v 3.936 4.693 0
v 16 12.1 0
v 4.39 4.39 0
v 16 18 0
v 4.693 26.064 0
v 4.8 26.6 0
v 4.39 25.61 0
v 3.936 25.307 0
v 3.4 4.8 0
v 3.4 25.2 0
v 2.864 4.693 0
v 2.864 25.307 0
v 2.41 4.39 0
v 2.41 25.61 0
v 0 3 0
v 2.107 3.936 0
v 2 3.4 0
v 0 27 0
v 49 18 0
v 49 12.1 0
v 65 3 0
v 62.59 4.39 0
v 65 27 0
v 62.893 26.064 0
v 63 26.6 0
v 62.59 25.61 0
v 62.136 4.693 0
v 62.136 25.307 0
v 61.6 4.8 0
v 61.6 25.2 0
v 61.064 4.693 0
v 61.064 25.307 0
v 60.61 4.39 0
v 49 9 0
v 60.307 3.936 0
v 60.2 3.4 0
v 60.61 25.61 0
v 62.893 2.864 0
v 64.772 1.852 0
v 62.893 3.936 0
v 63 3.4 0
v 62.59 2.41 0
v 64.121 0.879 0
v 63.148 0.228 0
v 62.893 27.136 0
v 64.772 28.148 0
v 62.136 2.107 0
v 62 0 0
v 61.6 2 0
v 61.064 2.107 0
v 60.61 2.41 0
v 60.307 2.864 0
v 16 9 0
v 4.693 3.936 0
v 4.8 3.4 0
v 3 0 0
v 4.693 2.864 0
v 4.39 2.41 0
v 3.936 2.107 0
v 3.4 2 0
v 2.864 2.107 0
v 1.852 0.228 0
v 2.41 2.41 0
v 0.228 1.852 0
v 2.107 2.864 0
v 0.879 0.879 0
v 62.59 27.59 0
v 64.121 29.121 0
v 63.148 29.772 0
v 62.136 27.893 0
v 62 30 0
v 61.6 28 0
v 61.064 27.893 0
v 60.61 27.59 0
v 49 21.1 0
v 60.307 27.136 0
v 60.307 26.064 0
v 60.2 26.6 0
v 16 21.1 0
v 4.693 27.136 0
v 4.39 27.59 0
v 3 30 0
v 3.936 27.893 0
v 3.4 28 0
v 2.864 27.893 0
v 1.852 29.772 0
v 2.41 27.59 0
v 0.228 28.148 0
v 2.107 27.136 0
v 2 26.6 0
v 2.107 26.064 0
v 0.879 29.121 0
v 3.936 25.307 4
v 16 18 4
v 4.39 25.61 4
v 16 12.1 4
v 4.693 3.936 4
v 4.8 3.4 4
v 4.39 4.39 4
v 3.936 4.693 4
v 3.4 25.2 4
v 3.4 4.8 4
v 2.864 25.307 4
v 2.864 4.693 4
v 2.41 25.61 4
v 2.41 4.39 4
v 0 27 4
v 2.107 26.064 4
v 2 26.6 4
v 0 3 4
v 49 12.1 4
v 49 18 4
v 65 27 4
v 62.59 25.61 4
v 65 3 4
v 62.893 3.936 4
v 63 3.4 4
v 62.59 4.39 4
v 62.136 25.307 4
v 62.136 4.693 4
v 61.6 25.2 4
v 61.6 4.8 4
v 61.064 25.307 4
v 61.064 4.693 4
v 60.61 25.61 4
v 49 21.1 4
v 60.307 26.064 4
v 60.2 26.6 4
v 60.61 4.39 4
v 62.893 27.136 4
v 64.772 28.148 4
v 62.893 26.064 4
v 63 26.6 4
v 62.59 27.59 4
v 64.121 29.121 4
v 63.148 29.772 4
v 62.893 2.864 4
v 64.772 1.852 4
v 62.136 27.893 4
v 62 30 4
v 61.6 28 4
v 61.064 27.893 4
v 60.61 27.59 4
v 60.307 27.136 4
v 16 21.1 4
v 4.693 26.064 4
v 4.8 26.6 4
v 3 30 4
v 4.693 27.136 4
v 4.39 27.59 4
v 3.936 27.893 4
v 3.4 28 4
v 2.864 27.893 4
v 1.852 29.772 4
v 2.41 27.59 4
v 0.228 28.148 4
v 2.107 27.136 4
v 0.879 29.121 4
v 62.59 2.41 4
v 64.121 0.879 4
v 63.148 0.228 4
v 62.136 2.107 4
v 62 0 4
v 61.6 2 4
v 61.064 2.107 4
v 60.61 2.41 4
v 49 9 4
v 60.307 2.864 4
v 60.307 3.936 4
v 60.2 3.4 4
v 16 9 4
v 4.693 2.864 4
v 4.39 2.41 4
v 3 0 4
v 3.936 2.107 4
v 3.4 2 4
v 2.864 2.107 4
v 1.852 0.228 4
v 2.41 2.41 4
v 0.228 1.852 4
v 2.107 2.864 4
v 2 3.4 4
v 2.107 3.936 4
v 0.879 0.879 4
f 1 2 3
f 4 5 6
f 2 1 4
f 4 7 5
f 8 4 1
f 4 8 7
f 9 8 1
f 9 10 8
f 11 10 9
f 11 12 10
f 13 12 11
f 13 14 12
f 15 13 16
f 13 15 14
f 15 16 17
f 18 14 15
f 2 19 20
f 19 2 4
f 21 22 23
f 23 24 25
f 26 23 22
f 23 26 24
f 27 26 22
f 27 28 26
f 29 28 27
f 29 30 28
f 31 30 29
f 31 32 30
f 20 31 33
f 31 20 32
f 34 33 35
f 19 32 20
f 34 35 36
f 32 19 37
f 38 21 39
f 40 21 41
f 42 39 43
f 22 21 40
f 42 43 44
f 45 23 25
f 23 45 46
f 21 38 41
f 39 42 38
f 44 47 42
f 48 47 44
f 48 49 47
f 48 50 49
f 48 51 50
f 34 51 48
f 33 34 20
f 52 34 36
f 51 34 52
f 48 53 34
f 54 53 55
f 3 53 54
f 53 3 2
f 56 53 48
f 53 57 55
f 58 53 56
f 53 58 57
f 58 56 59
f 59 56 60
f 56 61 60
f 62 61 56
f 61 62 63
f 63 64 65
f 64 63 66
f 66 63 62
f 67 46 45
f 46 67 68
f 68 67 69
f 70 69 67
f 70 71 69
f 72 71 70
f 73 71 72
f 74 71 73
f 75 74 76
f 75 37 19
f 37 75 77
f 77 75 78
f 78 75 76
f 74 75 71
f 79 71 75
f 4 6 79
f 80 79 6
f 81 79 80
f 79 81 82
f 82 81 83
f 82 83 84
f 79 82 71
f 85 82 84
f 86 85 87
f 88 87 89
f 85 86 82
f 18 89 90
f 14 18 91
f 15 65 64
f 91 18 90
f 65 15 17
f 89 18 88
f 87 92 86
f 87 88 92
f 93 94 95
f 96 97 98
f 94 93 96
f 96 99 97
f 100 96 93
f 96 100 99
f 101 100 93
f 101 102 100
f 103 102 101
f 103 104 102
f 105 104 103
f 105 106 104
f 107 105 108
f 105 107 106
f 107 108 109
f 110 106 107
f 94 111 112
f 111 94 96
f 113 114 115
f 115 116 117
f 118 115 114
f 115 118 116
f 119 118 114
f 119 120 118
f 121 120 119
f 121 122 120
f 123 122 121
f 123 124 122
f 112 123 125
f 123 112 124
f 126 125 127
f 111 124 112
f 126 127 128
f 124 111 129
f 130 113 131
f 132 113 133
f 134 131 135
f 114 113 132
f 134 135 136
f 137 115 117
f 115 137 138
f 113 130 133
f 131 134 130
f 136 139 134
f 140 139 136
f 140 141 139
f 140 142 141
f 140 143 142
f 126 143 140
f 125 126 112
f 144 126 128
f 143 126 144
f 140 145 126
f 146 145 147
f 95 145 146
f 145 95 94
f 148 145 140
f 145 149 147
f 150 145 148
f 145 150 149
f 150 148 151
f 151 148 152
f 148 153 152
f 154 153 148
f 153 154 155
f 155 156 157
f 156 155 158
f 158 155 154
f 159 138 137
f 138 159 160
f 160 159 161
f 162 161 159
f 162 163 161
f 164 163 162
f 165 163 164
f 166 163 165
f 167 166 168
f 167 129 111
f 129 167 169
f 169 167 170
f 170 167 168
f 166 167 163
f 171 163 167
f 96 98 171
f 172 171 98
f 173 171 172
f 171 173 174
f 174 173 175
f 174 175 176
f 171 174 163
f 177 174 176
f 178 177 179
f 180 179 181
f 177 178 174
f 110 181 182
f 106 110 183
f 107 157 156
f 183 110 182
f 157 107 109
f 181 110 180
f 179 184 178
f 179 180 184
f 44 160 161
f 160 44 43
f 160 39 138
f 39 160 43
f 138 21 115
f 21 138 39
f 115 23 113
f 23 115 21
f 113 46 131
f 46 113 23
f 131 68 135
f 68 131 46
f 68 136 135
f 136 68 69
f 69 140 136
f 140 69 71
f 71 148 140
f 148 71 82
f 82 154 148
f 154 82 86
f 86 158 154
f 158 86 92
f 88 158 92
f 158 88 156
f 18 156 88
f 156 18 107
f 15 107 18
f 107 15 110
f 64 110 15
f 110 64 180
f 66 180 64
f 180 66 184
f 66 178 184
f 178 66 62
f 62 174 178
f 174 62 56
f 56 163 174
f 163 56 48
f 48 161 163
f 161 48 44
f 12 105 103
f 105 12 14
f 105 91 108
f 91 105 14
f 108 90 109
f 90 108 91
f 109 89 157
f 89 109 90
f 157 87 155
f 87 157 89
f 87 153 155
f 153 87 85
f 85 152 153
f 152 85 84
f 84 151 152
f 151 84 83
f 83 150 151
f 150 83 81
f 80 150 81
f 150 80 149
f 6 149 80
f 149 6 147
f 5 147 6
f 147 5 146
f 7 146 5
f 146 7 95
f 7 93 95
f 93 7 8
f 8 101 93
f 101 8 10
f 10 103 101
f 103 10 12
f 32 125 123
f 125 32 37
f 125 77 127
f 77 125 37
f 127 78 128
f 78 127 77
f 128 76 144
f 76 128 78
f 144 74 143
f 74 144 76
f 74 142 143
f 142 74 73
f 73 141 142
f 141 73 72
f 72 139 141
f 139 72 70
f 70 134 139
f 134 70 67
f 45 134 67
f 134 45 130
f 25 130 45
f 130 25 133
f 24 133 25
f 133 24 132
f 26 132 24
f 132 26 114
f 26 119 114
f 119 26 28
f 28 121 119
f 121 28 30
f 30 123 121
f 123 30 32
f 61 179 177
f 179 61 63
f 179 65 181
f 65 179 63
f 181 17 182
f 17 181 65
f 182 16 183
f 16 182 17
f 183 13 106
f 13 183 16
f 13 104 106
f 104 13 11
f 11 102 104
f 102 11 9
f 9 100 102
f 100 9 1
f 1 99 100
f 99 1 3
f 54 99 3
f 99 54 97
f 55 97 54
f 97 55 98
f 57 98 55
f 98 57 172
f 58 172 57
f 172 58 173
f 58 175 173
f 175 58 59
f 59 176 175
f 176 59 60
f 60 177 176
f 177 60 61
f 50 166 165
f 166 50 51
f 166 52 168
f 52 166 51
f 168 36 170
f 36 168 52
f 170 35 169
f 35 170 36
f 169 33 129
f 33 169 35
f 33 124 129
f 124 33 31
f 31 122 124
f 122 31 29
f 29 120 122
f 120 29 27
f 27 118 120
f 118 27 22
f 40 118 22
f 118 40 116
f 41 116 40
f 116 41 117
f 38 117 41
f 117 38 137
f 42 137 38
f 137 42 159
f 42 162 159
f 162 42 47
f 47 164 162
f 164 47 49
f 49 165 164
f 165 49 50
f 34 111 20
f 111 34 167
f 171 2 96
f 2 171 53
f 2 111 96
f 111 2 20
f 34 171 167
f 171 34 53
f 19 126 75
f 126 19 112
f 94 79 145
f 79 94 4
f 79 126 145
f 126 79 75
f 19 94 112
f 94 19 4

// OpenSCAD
// Pi Zero W Plate

LENGTH = 65;
WIDTH = 30;

module plate(
    peg_hole_radius=1.4,
    peg_offset=2,
    plate_height=2
) {
    linear_extrude(height=plate_height)
    difference() {
        hull() {
            let (radius = 3) {
                translate([radius,radius,0]) 
                    circle(r=radius, $fn=16);
                translate([(LENGTH - radius),radius,0]) 
                    circle(r=radius, $fn=16);
                
                // TOP
                translate([radius,WIDTH - radius,0]) 
                    circle(r=radius, $fn=16);
                translate([(LENGTH - radius),WIDTH - radius,0]) 
                    circle(r=radius, $fn=16);
            }
        }
        
        
        let(offset=peg_offset+peg_hole_radius) {
            translate([offset,offset,0])
                circle(peg_hole_radius, $fn=16);
        
            translate([offset,WIDTH - offset,0])
                circle(peg_hole_radius, $fn=16);
            
            translate([LENGTH-offset,offset,0])
                circle(peg_hole_radius, $fn=16);
        
            translate([LENGTH-offset,WIDTH - offset,0])
                circle(peg_hole_radius, $fn=16);

        }
    }
}

// Mounting clip slots
difference(){
  plate(plate_height=4);
  
  // Distance between the slots is 8mm
  // Slot thickness = 3.1mm
  translate([(65-33)/2, 9,-10])
  cube([33,3.1,20]);
  
  translate([(65-33)/2, 18,-10])
  cube([33,3.1,20]);
}
